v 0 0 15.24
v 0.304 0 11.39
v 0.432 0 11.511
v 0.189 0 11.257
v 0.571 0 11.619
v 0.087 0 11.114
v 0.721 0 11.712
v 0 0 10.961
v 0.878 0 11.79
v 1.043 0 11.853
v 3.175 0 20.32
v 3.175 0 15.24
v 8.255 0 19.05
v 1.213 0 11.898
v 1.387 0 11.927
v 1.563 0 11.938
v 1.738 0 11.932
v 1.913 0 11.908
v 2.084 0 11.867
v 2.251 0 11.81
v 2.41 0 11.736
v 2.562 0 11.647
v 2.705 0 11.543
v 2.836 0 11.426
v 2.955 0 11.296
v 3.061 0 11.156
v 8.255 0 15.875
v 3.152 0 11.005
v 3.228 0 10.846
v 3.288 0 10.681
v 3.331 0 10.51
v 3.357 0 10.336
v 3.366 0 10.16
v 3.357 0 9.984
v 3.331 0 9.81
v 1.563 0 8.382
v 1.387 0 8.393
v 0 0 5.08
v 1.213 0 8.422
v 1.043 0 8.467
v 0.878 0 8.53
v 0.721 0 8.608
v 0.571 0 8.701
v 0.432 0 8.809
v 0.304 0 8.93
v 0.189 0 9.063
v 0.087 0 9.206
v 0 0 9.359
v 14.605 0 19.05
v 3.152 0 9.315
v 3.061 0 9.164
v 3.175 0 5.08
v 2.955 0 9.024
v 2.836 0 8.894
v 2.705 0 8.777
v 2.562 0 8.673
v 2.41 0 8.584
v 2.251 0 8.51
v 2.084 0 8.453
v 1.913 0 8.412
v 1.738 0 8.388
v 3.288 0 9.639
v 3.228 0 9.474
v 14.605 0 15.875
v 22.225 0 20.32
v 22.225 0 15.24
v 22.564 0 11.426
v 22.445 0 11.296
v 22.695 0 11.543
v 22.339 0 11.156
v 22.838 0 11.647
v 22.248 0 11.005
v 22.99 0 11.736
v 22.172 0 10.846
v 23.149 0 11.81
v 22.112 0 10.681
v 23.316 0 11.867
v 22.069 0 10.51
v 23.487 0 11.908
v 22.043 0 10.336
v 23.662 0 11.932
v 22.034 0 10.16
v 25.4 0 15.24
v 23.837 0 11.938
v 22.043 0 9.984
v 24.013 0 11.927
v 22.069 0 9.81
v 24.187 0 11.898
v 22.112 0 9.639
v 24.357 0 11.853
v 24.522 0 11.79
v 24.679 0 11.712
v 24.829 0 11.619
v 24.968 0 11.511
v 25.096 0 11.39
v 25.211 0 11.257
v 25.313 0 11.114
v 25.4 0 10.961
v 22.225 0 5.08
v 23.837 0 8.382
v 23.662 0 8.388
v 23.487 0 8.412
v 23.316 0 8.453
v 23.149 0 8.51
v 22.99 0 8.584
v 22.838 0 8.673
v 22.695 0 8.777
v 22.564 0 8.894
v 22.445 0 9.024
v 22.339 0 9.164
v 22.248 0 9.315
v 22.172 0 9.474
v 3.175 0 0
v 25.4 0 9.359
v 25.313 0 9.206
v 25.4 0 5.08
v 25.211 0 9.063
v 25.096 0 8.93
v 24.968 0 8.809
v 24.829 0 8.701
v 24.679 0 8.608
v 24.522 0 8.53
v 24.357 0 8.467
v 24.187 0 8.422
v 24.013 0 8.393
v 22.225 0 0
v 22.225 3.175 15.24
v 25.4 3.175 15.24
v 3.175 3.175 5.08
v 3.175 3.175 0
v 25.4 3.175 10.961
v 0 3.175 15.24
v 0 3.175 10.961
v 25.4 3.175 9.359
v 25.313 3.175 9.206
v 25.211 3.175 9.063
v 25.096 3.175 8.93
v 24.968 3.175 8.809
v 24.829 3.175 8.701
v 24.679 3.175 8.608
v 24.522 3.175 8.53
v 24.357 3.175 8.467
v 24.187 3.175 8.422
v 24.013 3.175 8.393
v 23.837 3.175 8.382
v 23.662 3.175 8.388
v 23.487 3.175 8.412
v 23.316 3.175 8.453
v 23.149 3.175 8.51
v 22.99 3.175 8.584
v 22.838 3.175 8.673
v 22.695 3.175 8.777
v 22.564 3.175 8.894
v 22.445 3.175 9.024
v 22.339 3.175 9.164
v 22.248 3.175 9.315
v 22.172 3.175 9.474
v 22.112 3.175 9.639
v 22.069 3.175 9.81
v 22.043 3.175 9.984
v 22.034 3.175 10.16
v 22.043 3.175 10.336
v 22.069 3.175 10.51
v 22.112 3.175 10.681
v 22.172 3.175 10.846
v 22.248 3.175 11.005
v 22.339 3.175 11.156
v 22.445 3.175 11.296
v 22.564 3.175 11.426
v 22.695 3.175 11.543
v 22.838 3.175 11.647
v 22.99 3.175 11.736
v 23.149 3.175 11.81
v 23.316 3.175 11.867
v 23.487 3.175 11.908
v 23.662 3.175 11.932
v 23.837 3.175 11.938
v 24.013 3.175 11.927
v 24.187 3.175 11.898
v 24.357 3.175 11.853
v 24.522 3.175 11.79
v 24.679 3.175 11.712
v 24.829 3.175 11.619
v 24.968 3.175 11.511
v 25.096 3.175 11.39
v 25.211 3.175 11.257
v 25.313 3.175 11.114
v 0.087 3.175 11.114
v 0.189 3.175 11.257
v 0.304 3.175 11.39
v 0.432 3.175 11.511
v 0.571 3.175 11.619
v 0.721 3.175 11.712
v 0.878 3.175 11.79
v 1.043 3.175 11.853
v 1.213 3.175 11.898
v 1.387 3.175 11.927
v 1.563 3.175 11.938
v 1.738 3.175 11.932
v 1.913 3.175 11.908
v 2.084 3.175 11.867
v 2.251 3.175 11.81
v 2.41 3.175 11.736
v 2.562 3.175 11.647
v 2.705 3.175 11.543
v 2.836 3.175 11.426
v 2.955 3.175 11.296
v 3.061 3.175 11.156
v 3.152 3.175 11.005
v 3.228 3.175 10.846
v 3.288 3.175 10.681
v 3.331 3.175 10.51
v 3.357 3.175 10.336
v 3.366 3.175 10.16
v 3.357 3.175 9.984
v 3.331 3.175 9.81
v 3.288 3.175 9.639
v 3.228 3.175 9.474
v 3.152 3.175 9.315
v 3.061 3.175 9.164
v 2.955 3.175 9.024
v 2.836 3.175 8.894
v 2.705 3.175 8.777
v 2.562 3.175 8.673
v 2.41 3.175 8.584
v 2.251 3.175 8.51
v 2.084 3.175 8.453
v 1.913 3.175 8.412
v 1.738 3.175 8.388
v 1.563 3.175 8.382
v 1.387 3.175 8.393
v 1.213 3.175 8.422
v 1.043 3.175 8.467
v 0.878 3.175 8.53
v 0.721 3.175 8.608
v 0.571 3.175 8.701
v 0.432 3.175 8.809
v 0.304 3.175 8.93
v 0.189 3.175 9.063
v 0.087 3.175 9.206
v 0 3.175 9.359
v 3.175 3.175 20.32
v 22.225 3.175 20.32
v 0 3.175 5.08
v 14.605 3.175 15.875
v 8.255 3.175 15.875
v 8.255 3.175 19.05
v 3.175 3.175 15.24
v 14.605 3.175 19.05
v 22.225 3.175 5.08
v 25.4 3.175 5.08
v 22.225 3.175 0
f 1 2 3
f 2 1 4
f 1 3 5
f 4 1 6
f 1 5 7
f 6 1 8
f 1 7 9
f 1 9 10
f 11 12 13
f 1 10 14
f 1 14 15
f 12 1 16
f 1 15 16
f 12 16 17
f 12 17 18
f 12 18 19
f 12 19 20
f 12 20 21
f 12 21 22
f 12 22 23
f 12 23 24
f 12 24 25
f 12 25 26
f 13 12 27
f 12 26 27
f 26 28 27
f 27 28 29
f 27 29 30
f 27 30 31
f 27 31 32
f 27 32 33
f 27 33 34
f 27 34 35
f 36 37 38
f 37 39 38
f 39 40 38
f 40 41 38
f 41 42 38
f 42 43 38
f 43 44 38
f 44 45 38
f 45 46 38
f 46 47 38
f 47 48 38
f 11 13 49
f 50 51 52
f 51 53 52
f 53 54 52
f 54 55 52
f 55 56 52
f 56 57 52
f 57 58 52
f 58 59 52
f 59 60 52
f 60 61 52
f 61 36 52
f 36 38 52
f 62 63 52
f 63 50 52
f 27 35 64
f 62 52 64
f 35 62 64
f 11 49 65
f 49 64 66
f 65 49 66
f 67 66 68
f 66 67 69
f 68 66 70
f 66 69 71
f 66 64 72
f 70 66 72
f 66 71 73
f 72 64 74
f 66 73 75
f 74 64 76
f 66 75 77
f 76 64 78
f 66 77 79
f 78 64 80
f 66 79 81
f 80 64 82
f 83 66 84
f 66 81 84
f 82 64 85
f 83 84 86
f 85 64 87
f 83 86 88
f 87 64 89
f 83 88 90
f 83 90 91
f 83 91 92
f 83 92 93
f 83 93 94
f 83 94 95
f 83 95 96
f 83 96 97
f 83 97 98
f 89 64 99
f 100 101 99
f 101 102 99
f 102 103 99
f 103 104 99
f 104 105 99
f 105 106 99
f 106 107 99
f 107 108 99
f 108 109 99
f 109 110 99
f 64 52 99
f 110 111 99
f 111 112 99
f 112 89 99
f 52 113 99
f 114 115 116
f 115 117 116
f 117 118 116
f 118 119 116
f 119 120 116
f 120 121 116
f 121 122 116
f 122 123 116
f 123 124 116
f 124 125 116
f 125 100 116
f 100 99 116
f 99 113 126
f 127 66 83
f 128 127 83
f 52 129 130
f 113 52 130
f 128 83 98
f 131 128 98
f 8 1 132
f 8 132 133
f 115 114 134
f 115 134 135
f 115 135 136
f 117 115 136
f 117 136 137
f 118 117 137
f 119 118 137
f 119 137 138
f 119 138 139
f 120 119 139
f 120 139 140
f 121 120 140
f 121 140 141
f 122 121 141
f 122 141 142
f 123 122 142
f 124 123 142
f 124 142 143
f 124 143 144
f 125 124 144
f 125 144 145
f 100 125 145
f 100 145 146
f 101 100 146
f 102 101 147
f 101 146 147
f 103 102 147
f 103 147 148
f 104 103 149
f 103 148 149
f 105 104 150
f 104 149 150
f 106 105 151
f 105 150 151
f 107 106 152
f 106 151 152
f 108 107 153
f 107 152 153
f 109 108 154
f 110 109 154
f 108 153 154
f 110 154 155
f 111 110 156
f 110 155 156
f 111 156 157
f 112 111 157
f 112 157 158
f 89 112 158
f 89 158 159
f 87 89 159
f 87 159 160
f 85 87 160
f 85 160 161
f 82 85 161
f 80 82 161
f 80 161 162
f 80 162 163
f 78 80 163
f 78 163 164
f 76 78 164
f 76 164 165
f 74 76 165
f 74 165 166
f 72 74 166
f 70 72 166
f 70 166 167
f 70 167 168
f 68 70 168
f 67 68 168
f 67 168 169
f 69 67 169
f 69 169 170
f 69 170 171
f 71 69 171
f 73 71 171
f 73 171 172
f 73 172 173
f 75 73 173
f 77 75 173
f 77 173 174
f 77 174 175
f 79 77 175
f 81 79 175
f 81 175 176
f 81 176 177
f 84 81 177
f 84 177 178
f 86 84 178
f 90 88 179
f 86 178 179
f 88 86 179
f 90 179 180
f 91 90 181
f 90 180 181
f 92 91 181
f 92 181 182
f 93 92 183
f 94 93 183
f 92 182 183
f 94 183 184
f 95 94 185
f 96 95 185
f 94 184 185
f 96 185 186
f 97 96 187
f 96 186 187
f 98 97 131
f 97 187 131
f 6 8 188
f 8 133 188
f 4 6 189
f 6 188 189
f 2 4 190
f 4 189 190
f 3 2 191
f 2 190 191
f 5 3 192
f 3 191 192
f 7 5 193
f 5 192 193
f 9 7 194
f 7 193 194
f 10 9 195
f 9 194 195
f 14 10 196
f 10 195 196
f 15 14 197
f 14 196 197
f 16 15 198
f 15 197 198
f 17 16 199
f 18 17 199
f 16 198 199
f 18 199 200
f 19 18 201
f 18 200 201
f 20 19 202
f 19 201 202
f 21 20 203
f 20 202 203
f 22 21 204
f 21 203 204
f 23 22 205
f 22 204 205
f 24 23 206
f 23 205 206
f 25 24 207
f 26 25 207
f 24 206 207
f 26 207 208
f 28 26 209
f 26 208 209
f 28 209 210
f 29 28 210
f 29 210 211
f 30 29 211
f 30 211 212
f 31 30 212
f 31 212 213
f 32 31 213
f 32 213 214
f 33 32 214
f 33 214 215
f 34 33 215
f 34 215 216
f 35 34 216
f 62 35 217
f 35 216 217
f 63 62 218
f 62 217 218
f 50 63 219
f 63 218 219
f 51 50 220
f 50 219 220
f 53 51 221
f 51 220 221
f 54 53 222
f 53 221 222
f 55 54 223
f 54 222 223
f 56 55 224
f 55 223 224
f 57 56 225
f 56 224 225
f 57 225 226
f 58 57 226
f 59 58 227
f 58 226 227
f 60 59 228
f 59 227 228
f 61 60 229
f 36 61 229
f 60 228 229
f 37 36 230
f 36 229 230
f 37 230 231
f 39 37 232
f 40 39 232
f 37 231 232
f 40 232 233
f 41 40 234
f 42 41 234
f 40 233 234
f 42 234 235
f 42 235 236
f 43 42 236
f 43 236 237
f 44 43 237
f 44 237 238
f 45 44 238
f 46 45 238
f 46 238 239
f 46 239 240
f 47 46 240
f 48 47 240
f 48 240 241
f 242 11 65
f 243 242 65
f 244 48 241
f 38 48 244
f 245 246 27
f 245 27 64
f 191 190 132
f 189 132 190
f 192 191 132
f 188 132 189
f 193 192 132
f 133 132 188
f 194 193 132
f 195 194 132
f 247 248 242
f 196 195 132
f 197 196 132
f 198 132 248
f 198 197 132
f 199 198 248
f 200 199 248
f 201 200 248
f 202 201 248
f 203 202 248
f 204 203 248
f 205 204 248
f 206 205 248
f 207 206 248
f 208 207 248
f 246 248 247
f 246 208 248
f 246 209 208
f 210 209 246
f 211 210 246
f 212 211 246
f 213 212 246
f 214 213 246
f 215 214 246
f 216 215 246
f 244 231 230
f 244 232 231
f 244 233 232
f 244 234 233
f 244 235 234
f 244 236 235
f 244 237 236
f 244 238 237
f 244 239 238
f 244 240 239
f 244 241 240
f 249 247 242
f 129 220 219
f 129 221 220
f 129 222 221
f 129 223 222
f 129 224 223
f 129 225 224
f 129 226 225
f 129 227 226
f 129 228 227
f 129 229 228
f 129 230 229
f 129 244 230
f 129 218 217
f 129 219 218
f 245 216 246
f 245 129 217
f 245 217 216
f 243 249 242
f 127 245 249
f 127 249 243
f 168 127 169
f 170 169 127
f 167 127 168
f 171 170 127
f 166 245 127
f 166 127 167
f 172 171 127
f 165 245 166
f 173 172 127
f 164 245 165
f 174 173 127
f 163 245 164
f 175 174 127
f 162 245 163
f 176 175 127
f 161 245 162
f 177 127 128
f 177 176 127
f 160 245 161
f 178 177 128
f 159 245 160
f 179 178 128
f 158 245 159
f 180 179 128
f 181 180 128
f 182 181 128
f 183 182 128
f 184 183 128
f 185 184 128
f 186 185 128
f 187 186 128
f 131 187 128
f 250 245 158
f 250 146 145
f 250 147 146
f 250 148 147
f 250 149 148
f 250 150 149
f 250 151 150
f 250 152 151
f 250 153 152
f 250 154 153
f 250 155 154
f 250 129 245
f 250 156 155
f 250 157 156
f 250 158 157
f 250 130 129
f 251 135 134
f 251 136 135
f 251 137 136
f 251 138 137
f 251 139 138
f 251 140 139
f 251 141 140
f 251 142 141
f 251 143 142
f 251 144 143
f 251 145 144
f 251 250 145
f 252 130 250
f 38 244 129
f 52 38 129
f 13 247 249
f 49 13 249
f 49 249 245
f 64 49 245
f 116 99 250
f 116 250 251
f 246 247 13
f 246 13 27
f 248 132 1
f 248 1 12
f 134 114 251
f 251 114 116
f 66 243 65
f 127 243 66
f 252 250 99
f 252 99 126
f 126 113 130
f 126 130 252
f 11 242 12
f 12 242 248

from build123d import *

# Parameters (mm, degrees)
SKETCH1_W           = 25.4
SKETCH1_H           = 20.32
BOSS_EXTRUDE1_DEPTH = 3.175
SKETCH2_W           = 3.175
SKETCH2_H           = 5.08
CUT_EXTRUDE1_DEPTH  = 3.175
SKETCH3_R           = 1.778
CUT_EXTRUDE2_DEPTH  = 3.175
SKETCH4_W           = 6.35
SKETCH4_H           = 3.175
CUT_EXTRUDE3_DEPTH  = 3.175


with BuildPart() as part:
    # Sketch1 → Boss-Extrude1 (new body)
    with BuildSketch(Plane(origin=(0, 0, 0), x_dir=(1, 0, 0), z_dir=(0, 1, 0))):
        with Locations((12.7, -10.16)):
            Rectangle(SKETCH1_W, SKETCH1_H)
    extrude(amount=BOSS_EXTRUDE1_DEPTH)

    # Sketch2 → Cut-Extrude1 (cut)
    with BuildSketch(Plane(origin=(0, 3.175, 0), x_dir=(1, 0, 0), z_dir=(0, 1, 0))):
        with Locations((1.5875, -2.54)):
            Rectangle(SKETCH2_W, SKETCH2_H)
        with Locations((1.5875, -17.78)):
            Rectangle(SKETCH2_W, SKETCH2_H)
        with Locations((23.8125, -2.54)):
            Rectangle(SKETCH2_W, SKETCH2_H)
        with Locations((23.8125, -17.78)):
            Rectangle(SKETCH2_W, SKETCH2_H)
    extrude(amount=-CUT_EXTRUDE1_DEPTH, mode=Mode.SUBTRACT)

    # Sketch3 → Cut-Extrude2 (cut)
    with BuildSketch(Plane(origin=(0, 3.175, 0), x_dir=(1, 0, 0), z_dir=(0, 1, 0))):
        with Locations((1.5875, -10.16)):
            Circle(SKETCH3_R)
        with Locations((23.8125, -10.16)):
            Circle(SKETCH3_R)
    extrude(amount=-CUT_EXTRUDE2_DEPTH, mode=Mode.SUBTRACT)

    # Sketch4 → Cut-Extrude3 (cut)
    with BuildSketch(Plane(origin=(0, 3.175, 0), x_dir=(1, 0, 0), z_dir=(0, 1, 0))):
        with Locations((11.43, -17.4625)):
            Rectangle(SKETCH4_W, SKETCH4_H)
    extrude(amount=-CUT_EXTRUDE3_DEPTH, mode=Mode.SUBTRACT)


solid = part.part
